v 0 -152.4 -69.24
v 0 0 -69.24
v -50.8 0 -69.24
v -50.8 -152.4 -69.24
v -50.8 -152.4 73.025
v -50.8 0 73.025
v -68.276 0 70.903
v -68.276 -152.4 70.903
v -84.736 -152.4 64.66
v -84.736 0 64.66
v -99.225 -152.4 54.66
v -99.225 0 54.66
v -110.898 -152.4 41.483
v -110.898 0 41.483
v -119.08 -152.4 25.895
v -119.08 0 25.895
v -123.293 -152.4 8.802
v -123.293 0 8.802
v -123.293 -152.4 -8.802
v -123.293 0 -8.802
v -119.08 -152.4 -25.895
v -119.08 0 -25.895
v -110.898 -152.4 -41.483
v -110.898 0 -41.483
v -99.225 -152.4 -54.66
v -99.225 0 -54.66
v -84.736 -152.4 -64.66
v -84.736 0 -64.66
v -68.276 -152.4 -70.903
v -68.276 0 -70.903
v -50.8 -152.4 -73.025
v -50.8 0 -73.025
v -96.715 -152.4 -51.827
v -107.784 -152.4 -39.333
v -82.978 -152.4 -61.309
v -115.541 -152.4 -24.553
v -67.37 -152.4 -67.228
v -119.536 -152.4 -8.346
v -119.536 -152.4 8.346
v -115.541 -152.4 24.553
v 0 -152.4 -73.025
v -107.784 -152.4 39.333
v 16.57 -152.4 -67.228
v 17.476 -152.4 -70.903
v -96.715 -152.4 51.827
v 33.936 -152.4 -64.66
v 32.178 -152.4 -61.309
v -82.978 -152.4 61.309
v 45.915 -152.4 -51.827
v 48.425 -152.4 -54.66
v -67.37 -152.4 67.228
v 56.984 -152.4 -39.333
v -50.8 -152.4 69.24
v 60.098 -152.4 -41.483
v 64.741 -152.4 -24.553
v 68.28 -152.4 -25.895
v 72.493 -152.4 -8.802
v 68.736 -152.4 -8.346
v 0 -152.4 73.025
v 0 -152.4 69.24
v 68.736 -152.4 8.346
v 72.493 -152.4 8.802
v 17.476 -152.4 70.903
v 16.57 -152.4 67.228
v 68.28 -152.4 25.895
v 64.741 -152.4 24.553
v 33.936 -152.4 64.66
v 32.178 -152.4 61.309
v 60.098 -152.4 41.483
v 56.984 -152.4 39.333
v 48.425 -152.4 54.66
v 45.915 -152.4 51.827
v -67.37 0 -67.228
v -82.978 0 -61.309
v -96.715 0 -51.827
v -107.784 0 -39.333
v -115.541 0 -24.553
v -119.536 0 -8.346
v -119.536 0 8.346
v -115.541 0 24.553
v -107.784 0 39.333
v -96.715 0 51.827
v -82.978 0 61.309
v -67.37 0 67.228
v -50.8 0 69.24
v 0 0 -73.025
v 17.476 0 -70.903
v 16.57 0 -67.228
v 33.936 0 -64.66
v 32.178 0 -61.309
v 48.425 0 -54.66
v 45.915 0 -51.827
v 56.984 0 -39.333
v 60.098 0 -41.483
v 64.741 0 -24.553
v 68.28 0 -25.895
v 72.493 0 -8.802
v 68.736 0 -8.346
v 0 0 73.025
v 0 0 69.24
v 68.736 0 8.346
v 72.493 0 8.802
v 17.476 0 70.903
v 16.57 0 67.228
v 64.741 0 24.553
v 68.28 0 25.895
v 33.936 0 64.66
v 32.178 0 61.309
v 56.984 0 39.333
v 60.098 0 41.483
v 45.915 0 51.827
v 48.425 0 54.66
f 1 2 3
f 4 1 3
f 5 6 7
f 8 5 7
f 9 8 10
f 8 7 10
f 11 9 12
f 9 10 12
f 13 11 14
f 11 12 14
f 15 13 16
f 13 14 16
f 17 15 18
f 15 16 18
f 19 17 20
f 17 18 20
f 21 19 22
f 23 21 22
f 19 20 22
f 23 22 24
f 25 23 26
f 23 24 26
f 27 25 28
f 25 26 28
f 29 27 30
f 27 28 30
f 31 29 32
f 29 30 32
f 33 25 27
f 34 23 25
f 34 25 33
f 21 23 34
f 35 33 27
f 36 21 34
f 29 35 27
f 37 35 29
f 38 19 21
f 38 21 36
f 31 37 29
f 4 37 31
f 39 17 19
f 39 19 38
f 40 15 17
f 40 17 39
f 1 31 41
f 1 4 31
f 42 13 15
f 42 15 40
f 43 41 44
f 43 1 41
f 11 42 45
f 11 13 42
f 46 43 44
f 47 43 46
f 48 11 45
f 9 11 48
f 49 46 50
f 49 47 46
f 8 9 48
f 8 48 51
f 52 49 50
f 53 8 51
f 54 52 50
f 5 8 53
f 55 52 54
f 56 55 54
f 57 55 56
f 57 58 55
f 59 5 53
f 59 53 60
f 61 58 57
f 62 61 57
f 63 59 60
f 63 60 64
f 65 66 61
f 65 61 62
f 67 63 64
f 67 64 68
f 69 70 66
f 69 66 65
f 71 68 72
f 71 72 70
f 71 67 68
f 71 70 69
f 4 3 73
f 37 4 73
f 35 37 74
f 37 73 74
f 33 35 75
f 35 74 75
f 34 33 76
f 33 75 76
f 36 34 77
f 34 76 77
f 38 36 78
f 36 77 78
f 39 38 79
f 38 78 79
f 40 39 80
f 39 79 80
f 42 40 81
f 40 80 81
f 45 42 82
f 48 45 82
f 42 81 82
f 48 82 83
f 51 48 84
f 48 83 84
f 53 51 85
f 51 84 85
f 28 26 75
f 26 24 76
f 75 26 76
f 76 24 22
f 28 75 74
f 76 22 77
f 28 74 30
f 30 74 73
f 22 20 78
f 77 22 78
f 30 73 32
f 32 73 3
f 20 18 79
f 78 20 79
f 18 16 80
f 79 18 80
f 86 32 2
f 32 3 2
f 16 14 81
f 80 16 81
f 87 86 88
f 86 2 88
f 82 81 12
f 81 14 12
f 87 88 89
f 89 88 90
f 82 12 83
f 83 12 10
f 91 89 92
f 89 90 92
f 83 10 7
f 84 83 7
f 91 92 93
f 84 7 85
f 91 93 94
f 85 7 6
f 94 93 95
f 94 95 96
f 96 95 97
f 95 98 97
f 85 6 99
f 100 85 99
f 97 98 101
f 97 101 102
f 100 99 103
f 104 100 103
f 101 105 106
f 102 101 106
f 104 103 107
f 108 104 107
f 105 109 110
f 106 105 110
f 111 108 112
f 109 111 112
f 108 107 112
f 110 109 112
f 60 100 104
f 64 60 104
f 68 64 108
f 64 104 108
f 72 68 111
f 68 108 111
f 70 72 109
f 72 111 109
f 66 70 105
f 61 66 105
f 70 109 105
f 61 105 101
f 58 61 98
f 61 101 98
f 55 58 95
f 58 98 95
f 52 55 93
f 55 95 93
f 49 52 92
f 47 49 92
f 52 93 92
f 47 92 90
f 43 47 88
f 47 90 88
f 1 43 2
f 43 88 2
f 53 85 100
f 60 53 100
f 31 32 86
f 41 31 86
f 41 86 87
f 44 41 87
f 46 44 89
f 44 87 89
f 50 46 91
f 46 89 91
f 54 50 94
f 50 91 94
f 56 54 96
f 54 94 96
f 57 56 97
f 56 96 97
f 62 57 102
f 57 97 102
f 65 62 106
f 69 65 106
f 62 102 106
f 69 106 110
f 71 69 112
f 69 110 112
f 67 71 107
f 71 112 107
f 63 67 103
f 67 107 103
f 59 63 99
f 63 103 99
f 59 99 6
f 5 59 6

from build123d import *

# Parameters (mm, degrees)
F1_DEPTH = 152.4


with BuildPart() as f1:
    # F0 (on Front) → F1 (new body)
    with BuildSketch(Plane.XZ):
        with BuildLine():
            Line((-50.8, -73.025), (-25.4, -73.025))
            Line((-25.4, -73.025), (-25.4, -69.240349))
            Line((-25.4, -69.240349), (-50.8, -69.240349))
            ThreePointArc((-50.8, -69.240349), (-120.040349, 0), (-50.8, 69.240349))
            Line((-50.8, 69.240349), (-25.4, 69.240349))
            Line((-25.4, 69.240349), (-25.4, 73.025))
            Line((-25.4, 73.025), (-50.8, 73.025))
            ThreePointArc((-50.8, 73.025), (-123.825, 0), (-50.8, -73.025))
        make_face()
        with BuildLine():
            Line((-25.4, -73.025), (0, -73.025))
            ThreePointArc((0, -73.025), (73.025, 0), (0, 73.025))
            Line((0, 73.025), (-25.4, 73.025))
            Line((-25.4, 73.025), (-25.4, 69.240349))
            Line((-25.4, 69.240349), (0, 69.240349))
            ThreePointArc((0, 69.240349), (69.240349, 0), (0, -69.240349))
            Line((0, -69.240349), (-25.4, -69.240349))
            Line((-25.4, -69.240349), (-25.4, -73.025))
        make_face()
    extrude(amount=F1_DEPTH)


solid = f1.part
